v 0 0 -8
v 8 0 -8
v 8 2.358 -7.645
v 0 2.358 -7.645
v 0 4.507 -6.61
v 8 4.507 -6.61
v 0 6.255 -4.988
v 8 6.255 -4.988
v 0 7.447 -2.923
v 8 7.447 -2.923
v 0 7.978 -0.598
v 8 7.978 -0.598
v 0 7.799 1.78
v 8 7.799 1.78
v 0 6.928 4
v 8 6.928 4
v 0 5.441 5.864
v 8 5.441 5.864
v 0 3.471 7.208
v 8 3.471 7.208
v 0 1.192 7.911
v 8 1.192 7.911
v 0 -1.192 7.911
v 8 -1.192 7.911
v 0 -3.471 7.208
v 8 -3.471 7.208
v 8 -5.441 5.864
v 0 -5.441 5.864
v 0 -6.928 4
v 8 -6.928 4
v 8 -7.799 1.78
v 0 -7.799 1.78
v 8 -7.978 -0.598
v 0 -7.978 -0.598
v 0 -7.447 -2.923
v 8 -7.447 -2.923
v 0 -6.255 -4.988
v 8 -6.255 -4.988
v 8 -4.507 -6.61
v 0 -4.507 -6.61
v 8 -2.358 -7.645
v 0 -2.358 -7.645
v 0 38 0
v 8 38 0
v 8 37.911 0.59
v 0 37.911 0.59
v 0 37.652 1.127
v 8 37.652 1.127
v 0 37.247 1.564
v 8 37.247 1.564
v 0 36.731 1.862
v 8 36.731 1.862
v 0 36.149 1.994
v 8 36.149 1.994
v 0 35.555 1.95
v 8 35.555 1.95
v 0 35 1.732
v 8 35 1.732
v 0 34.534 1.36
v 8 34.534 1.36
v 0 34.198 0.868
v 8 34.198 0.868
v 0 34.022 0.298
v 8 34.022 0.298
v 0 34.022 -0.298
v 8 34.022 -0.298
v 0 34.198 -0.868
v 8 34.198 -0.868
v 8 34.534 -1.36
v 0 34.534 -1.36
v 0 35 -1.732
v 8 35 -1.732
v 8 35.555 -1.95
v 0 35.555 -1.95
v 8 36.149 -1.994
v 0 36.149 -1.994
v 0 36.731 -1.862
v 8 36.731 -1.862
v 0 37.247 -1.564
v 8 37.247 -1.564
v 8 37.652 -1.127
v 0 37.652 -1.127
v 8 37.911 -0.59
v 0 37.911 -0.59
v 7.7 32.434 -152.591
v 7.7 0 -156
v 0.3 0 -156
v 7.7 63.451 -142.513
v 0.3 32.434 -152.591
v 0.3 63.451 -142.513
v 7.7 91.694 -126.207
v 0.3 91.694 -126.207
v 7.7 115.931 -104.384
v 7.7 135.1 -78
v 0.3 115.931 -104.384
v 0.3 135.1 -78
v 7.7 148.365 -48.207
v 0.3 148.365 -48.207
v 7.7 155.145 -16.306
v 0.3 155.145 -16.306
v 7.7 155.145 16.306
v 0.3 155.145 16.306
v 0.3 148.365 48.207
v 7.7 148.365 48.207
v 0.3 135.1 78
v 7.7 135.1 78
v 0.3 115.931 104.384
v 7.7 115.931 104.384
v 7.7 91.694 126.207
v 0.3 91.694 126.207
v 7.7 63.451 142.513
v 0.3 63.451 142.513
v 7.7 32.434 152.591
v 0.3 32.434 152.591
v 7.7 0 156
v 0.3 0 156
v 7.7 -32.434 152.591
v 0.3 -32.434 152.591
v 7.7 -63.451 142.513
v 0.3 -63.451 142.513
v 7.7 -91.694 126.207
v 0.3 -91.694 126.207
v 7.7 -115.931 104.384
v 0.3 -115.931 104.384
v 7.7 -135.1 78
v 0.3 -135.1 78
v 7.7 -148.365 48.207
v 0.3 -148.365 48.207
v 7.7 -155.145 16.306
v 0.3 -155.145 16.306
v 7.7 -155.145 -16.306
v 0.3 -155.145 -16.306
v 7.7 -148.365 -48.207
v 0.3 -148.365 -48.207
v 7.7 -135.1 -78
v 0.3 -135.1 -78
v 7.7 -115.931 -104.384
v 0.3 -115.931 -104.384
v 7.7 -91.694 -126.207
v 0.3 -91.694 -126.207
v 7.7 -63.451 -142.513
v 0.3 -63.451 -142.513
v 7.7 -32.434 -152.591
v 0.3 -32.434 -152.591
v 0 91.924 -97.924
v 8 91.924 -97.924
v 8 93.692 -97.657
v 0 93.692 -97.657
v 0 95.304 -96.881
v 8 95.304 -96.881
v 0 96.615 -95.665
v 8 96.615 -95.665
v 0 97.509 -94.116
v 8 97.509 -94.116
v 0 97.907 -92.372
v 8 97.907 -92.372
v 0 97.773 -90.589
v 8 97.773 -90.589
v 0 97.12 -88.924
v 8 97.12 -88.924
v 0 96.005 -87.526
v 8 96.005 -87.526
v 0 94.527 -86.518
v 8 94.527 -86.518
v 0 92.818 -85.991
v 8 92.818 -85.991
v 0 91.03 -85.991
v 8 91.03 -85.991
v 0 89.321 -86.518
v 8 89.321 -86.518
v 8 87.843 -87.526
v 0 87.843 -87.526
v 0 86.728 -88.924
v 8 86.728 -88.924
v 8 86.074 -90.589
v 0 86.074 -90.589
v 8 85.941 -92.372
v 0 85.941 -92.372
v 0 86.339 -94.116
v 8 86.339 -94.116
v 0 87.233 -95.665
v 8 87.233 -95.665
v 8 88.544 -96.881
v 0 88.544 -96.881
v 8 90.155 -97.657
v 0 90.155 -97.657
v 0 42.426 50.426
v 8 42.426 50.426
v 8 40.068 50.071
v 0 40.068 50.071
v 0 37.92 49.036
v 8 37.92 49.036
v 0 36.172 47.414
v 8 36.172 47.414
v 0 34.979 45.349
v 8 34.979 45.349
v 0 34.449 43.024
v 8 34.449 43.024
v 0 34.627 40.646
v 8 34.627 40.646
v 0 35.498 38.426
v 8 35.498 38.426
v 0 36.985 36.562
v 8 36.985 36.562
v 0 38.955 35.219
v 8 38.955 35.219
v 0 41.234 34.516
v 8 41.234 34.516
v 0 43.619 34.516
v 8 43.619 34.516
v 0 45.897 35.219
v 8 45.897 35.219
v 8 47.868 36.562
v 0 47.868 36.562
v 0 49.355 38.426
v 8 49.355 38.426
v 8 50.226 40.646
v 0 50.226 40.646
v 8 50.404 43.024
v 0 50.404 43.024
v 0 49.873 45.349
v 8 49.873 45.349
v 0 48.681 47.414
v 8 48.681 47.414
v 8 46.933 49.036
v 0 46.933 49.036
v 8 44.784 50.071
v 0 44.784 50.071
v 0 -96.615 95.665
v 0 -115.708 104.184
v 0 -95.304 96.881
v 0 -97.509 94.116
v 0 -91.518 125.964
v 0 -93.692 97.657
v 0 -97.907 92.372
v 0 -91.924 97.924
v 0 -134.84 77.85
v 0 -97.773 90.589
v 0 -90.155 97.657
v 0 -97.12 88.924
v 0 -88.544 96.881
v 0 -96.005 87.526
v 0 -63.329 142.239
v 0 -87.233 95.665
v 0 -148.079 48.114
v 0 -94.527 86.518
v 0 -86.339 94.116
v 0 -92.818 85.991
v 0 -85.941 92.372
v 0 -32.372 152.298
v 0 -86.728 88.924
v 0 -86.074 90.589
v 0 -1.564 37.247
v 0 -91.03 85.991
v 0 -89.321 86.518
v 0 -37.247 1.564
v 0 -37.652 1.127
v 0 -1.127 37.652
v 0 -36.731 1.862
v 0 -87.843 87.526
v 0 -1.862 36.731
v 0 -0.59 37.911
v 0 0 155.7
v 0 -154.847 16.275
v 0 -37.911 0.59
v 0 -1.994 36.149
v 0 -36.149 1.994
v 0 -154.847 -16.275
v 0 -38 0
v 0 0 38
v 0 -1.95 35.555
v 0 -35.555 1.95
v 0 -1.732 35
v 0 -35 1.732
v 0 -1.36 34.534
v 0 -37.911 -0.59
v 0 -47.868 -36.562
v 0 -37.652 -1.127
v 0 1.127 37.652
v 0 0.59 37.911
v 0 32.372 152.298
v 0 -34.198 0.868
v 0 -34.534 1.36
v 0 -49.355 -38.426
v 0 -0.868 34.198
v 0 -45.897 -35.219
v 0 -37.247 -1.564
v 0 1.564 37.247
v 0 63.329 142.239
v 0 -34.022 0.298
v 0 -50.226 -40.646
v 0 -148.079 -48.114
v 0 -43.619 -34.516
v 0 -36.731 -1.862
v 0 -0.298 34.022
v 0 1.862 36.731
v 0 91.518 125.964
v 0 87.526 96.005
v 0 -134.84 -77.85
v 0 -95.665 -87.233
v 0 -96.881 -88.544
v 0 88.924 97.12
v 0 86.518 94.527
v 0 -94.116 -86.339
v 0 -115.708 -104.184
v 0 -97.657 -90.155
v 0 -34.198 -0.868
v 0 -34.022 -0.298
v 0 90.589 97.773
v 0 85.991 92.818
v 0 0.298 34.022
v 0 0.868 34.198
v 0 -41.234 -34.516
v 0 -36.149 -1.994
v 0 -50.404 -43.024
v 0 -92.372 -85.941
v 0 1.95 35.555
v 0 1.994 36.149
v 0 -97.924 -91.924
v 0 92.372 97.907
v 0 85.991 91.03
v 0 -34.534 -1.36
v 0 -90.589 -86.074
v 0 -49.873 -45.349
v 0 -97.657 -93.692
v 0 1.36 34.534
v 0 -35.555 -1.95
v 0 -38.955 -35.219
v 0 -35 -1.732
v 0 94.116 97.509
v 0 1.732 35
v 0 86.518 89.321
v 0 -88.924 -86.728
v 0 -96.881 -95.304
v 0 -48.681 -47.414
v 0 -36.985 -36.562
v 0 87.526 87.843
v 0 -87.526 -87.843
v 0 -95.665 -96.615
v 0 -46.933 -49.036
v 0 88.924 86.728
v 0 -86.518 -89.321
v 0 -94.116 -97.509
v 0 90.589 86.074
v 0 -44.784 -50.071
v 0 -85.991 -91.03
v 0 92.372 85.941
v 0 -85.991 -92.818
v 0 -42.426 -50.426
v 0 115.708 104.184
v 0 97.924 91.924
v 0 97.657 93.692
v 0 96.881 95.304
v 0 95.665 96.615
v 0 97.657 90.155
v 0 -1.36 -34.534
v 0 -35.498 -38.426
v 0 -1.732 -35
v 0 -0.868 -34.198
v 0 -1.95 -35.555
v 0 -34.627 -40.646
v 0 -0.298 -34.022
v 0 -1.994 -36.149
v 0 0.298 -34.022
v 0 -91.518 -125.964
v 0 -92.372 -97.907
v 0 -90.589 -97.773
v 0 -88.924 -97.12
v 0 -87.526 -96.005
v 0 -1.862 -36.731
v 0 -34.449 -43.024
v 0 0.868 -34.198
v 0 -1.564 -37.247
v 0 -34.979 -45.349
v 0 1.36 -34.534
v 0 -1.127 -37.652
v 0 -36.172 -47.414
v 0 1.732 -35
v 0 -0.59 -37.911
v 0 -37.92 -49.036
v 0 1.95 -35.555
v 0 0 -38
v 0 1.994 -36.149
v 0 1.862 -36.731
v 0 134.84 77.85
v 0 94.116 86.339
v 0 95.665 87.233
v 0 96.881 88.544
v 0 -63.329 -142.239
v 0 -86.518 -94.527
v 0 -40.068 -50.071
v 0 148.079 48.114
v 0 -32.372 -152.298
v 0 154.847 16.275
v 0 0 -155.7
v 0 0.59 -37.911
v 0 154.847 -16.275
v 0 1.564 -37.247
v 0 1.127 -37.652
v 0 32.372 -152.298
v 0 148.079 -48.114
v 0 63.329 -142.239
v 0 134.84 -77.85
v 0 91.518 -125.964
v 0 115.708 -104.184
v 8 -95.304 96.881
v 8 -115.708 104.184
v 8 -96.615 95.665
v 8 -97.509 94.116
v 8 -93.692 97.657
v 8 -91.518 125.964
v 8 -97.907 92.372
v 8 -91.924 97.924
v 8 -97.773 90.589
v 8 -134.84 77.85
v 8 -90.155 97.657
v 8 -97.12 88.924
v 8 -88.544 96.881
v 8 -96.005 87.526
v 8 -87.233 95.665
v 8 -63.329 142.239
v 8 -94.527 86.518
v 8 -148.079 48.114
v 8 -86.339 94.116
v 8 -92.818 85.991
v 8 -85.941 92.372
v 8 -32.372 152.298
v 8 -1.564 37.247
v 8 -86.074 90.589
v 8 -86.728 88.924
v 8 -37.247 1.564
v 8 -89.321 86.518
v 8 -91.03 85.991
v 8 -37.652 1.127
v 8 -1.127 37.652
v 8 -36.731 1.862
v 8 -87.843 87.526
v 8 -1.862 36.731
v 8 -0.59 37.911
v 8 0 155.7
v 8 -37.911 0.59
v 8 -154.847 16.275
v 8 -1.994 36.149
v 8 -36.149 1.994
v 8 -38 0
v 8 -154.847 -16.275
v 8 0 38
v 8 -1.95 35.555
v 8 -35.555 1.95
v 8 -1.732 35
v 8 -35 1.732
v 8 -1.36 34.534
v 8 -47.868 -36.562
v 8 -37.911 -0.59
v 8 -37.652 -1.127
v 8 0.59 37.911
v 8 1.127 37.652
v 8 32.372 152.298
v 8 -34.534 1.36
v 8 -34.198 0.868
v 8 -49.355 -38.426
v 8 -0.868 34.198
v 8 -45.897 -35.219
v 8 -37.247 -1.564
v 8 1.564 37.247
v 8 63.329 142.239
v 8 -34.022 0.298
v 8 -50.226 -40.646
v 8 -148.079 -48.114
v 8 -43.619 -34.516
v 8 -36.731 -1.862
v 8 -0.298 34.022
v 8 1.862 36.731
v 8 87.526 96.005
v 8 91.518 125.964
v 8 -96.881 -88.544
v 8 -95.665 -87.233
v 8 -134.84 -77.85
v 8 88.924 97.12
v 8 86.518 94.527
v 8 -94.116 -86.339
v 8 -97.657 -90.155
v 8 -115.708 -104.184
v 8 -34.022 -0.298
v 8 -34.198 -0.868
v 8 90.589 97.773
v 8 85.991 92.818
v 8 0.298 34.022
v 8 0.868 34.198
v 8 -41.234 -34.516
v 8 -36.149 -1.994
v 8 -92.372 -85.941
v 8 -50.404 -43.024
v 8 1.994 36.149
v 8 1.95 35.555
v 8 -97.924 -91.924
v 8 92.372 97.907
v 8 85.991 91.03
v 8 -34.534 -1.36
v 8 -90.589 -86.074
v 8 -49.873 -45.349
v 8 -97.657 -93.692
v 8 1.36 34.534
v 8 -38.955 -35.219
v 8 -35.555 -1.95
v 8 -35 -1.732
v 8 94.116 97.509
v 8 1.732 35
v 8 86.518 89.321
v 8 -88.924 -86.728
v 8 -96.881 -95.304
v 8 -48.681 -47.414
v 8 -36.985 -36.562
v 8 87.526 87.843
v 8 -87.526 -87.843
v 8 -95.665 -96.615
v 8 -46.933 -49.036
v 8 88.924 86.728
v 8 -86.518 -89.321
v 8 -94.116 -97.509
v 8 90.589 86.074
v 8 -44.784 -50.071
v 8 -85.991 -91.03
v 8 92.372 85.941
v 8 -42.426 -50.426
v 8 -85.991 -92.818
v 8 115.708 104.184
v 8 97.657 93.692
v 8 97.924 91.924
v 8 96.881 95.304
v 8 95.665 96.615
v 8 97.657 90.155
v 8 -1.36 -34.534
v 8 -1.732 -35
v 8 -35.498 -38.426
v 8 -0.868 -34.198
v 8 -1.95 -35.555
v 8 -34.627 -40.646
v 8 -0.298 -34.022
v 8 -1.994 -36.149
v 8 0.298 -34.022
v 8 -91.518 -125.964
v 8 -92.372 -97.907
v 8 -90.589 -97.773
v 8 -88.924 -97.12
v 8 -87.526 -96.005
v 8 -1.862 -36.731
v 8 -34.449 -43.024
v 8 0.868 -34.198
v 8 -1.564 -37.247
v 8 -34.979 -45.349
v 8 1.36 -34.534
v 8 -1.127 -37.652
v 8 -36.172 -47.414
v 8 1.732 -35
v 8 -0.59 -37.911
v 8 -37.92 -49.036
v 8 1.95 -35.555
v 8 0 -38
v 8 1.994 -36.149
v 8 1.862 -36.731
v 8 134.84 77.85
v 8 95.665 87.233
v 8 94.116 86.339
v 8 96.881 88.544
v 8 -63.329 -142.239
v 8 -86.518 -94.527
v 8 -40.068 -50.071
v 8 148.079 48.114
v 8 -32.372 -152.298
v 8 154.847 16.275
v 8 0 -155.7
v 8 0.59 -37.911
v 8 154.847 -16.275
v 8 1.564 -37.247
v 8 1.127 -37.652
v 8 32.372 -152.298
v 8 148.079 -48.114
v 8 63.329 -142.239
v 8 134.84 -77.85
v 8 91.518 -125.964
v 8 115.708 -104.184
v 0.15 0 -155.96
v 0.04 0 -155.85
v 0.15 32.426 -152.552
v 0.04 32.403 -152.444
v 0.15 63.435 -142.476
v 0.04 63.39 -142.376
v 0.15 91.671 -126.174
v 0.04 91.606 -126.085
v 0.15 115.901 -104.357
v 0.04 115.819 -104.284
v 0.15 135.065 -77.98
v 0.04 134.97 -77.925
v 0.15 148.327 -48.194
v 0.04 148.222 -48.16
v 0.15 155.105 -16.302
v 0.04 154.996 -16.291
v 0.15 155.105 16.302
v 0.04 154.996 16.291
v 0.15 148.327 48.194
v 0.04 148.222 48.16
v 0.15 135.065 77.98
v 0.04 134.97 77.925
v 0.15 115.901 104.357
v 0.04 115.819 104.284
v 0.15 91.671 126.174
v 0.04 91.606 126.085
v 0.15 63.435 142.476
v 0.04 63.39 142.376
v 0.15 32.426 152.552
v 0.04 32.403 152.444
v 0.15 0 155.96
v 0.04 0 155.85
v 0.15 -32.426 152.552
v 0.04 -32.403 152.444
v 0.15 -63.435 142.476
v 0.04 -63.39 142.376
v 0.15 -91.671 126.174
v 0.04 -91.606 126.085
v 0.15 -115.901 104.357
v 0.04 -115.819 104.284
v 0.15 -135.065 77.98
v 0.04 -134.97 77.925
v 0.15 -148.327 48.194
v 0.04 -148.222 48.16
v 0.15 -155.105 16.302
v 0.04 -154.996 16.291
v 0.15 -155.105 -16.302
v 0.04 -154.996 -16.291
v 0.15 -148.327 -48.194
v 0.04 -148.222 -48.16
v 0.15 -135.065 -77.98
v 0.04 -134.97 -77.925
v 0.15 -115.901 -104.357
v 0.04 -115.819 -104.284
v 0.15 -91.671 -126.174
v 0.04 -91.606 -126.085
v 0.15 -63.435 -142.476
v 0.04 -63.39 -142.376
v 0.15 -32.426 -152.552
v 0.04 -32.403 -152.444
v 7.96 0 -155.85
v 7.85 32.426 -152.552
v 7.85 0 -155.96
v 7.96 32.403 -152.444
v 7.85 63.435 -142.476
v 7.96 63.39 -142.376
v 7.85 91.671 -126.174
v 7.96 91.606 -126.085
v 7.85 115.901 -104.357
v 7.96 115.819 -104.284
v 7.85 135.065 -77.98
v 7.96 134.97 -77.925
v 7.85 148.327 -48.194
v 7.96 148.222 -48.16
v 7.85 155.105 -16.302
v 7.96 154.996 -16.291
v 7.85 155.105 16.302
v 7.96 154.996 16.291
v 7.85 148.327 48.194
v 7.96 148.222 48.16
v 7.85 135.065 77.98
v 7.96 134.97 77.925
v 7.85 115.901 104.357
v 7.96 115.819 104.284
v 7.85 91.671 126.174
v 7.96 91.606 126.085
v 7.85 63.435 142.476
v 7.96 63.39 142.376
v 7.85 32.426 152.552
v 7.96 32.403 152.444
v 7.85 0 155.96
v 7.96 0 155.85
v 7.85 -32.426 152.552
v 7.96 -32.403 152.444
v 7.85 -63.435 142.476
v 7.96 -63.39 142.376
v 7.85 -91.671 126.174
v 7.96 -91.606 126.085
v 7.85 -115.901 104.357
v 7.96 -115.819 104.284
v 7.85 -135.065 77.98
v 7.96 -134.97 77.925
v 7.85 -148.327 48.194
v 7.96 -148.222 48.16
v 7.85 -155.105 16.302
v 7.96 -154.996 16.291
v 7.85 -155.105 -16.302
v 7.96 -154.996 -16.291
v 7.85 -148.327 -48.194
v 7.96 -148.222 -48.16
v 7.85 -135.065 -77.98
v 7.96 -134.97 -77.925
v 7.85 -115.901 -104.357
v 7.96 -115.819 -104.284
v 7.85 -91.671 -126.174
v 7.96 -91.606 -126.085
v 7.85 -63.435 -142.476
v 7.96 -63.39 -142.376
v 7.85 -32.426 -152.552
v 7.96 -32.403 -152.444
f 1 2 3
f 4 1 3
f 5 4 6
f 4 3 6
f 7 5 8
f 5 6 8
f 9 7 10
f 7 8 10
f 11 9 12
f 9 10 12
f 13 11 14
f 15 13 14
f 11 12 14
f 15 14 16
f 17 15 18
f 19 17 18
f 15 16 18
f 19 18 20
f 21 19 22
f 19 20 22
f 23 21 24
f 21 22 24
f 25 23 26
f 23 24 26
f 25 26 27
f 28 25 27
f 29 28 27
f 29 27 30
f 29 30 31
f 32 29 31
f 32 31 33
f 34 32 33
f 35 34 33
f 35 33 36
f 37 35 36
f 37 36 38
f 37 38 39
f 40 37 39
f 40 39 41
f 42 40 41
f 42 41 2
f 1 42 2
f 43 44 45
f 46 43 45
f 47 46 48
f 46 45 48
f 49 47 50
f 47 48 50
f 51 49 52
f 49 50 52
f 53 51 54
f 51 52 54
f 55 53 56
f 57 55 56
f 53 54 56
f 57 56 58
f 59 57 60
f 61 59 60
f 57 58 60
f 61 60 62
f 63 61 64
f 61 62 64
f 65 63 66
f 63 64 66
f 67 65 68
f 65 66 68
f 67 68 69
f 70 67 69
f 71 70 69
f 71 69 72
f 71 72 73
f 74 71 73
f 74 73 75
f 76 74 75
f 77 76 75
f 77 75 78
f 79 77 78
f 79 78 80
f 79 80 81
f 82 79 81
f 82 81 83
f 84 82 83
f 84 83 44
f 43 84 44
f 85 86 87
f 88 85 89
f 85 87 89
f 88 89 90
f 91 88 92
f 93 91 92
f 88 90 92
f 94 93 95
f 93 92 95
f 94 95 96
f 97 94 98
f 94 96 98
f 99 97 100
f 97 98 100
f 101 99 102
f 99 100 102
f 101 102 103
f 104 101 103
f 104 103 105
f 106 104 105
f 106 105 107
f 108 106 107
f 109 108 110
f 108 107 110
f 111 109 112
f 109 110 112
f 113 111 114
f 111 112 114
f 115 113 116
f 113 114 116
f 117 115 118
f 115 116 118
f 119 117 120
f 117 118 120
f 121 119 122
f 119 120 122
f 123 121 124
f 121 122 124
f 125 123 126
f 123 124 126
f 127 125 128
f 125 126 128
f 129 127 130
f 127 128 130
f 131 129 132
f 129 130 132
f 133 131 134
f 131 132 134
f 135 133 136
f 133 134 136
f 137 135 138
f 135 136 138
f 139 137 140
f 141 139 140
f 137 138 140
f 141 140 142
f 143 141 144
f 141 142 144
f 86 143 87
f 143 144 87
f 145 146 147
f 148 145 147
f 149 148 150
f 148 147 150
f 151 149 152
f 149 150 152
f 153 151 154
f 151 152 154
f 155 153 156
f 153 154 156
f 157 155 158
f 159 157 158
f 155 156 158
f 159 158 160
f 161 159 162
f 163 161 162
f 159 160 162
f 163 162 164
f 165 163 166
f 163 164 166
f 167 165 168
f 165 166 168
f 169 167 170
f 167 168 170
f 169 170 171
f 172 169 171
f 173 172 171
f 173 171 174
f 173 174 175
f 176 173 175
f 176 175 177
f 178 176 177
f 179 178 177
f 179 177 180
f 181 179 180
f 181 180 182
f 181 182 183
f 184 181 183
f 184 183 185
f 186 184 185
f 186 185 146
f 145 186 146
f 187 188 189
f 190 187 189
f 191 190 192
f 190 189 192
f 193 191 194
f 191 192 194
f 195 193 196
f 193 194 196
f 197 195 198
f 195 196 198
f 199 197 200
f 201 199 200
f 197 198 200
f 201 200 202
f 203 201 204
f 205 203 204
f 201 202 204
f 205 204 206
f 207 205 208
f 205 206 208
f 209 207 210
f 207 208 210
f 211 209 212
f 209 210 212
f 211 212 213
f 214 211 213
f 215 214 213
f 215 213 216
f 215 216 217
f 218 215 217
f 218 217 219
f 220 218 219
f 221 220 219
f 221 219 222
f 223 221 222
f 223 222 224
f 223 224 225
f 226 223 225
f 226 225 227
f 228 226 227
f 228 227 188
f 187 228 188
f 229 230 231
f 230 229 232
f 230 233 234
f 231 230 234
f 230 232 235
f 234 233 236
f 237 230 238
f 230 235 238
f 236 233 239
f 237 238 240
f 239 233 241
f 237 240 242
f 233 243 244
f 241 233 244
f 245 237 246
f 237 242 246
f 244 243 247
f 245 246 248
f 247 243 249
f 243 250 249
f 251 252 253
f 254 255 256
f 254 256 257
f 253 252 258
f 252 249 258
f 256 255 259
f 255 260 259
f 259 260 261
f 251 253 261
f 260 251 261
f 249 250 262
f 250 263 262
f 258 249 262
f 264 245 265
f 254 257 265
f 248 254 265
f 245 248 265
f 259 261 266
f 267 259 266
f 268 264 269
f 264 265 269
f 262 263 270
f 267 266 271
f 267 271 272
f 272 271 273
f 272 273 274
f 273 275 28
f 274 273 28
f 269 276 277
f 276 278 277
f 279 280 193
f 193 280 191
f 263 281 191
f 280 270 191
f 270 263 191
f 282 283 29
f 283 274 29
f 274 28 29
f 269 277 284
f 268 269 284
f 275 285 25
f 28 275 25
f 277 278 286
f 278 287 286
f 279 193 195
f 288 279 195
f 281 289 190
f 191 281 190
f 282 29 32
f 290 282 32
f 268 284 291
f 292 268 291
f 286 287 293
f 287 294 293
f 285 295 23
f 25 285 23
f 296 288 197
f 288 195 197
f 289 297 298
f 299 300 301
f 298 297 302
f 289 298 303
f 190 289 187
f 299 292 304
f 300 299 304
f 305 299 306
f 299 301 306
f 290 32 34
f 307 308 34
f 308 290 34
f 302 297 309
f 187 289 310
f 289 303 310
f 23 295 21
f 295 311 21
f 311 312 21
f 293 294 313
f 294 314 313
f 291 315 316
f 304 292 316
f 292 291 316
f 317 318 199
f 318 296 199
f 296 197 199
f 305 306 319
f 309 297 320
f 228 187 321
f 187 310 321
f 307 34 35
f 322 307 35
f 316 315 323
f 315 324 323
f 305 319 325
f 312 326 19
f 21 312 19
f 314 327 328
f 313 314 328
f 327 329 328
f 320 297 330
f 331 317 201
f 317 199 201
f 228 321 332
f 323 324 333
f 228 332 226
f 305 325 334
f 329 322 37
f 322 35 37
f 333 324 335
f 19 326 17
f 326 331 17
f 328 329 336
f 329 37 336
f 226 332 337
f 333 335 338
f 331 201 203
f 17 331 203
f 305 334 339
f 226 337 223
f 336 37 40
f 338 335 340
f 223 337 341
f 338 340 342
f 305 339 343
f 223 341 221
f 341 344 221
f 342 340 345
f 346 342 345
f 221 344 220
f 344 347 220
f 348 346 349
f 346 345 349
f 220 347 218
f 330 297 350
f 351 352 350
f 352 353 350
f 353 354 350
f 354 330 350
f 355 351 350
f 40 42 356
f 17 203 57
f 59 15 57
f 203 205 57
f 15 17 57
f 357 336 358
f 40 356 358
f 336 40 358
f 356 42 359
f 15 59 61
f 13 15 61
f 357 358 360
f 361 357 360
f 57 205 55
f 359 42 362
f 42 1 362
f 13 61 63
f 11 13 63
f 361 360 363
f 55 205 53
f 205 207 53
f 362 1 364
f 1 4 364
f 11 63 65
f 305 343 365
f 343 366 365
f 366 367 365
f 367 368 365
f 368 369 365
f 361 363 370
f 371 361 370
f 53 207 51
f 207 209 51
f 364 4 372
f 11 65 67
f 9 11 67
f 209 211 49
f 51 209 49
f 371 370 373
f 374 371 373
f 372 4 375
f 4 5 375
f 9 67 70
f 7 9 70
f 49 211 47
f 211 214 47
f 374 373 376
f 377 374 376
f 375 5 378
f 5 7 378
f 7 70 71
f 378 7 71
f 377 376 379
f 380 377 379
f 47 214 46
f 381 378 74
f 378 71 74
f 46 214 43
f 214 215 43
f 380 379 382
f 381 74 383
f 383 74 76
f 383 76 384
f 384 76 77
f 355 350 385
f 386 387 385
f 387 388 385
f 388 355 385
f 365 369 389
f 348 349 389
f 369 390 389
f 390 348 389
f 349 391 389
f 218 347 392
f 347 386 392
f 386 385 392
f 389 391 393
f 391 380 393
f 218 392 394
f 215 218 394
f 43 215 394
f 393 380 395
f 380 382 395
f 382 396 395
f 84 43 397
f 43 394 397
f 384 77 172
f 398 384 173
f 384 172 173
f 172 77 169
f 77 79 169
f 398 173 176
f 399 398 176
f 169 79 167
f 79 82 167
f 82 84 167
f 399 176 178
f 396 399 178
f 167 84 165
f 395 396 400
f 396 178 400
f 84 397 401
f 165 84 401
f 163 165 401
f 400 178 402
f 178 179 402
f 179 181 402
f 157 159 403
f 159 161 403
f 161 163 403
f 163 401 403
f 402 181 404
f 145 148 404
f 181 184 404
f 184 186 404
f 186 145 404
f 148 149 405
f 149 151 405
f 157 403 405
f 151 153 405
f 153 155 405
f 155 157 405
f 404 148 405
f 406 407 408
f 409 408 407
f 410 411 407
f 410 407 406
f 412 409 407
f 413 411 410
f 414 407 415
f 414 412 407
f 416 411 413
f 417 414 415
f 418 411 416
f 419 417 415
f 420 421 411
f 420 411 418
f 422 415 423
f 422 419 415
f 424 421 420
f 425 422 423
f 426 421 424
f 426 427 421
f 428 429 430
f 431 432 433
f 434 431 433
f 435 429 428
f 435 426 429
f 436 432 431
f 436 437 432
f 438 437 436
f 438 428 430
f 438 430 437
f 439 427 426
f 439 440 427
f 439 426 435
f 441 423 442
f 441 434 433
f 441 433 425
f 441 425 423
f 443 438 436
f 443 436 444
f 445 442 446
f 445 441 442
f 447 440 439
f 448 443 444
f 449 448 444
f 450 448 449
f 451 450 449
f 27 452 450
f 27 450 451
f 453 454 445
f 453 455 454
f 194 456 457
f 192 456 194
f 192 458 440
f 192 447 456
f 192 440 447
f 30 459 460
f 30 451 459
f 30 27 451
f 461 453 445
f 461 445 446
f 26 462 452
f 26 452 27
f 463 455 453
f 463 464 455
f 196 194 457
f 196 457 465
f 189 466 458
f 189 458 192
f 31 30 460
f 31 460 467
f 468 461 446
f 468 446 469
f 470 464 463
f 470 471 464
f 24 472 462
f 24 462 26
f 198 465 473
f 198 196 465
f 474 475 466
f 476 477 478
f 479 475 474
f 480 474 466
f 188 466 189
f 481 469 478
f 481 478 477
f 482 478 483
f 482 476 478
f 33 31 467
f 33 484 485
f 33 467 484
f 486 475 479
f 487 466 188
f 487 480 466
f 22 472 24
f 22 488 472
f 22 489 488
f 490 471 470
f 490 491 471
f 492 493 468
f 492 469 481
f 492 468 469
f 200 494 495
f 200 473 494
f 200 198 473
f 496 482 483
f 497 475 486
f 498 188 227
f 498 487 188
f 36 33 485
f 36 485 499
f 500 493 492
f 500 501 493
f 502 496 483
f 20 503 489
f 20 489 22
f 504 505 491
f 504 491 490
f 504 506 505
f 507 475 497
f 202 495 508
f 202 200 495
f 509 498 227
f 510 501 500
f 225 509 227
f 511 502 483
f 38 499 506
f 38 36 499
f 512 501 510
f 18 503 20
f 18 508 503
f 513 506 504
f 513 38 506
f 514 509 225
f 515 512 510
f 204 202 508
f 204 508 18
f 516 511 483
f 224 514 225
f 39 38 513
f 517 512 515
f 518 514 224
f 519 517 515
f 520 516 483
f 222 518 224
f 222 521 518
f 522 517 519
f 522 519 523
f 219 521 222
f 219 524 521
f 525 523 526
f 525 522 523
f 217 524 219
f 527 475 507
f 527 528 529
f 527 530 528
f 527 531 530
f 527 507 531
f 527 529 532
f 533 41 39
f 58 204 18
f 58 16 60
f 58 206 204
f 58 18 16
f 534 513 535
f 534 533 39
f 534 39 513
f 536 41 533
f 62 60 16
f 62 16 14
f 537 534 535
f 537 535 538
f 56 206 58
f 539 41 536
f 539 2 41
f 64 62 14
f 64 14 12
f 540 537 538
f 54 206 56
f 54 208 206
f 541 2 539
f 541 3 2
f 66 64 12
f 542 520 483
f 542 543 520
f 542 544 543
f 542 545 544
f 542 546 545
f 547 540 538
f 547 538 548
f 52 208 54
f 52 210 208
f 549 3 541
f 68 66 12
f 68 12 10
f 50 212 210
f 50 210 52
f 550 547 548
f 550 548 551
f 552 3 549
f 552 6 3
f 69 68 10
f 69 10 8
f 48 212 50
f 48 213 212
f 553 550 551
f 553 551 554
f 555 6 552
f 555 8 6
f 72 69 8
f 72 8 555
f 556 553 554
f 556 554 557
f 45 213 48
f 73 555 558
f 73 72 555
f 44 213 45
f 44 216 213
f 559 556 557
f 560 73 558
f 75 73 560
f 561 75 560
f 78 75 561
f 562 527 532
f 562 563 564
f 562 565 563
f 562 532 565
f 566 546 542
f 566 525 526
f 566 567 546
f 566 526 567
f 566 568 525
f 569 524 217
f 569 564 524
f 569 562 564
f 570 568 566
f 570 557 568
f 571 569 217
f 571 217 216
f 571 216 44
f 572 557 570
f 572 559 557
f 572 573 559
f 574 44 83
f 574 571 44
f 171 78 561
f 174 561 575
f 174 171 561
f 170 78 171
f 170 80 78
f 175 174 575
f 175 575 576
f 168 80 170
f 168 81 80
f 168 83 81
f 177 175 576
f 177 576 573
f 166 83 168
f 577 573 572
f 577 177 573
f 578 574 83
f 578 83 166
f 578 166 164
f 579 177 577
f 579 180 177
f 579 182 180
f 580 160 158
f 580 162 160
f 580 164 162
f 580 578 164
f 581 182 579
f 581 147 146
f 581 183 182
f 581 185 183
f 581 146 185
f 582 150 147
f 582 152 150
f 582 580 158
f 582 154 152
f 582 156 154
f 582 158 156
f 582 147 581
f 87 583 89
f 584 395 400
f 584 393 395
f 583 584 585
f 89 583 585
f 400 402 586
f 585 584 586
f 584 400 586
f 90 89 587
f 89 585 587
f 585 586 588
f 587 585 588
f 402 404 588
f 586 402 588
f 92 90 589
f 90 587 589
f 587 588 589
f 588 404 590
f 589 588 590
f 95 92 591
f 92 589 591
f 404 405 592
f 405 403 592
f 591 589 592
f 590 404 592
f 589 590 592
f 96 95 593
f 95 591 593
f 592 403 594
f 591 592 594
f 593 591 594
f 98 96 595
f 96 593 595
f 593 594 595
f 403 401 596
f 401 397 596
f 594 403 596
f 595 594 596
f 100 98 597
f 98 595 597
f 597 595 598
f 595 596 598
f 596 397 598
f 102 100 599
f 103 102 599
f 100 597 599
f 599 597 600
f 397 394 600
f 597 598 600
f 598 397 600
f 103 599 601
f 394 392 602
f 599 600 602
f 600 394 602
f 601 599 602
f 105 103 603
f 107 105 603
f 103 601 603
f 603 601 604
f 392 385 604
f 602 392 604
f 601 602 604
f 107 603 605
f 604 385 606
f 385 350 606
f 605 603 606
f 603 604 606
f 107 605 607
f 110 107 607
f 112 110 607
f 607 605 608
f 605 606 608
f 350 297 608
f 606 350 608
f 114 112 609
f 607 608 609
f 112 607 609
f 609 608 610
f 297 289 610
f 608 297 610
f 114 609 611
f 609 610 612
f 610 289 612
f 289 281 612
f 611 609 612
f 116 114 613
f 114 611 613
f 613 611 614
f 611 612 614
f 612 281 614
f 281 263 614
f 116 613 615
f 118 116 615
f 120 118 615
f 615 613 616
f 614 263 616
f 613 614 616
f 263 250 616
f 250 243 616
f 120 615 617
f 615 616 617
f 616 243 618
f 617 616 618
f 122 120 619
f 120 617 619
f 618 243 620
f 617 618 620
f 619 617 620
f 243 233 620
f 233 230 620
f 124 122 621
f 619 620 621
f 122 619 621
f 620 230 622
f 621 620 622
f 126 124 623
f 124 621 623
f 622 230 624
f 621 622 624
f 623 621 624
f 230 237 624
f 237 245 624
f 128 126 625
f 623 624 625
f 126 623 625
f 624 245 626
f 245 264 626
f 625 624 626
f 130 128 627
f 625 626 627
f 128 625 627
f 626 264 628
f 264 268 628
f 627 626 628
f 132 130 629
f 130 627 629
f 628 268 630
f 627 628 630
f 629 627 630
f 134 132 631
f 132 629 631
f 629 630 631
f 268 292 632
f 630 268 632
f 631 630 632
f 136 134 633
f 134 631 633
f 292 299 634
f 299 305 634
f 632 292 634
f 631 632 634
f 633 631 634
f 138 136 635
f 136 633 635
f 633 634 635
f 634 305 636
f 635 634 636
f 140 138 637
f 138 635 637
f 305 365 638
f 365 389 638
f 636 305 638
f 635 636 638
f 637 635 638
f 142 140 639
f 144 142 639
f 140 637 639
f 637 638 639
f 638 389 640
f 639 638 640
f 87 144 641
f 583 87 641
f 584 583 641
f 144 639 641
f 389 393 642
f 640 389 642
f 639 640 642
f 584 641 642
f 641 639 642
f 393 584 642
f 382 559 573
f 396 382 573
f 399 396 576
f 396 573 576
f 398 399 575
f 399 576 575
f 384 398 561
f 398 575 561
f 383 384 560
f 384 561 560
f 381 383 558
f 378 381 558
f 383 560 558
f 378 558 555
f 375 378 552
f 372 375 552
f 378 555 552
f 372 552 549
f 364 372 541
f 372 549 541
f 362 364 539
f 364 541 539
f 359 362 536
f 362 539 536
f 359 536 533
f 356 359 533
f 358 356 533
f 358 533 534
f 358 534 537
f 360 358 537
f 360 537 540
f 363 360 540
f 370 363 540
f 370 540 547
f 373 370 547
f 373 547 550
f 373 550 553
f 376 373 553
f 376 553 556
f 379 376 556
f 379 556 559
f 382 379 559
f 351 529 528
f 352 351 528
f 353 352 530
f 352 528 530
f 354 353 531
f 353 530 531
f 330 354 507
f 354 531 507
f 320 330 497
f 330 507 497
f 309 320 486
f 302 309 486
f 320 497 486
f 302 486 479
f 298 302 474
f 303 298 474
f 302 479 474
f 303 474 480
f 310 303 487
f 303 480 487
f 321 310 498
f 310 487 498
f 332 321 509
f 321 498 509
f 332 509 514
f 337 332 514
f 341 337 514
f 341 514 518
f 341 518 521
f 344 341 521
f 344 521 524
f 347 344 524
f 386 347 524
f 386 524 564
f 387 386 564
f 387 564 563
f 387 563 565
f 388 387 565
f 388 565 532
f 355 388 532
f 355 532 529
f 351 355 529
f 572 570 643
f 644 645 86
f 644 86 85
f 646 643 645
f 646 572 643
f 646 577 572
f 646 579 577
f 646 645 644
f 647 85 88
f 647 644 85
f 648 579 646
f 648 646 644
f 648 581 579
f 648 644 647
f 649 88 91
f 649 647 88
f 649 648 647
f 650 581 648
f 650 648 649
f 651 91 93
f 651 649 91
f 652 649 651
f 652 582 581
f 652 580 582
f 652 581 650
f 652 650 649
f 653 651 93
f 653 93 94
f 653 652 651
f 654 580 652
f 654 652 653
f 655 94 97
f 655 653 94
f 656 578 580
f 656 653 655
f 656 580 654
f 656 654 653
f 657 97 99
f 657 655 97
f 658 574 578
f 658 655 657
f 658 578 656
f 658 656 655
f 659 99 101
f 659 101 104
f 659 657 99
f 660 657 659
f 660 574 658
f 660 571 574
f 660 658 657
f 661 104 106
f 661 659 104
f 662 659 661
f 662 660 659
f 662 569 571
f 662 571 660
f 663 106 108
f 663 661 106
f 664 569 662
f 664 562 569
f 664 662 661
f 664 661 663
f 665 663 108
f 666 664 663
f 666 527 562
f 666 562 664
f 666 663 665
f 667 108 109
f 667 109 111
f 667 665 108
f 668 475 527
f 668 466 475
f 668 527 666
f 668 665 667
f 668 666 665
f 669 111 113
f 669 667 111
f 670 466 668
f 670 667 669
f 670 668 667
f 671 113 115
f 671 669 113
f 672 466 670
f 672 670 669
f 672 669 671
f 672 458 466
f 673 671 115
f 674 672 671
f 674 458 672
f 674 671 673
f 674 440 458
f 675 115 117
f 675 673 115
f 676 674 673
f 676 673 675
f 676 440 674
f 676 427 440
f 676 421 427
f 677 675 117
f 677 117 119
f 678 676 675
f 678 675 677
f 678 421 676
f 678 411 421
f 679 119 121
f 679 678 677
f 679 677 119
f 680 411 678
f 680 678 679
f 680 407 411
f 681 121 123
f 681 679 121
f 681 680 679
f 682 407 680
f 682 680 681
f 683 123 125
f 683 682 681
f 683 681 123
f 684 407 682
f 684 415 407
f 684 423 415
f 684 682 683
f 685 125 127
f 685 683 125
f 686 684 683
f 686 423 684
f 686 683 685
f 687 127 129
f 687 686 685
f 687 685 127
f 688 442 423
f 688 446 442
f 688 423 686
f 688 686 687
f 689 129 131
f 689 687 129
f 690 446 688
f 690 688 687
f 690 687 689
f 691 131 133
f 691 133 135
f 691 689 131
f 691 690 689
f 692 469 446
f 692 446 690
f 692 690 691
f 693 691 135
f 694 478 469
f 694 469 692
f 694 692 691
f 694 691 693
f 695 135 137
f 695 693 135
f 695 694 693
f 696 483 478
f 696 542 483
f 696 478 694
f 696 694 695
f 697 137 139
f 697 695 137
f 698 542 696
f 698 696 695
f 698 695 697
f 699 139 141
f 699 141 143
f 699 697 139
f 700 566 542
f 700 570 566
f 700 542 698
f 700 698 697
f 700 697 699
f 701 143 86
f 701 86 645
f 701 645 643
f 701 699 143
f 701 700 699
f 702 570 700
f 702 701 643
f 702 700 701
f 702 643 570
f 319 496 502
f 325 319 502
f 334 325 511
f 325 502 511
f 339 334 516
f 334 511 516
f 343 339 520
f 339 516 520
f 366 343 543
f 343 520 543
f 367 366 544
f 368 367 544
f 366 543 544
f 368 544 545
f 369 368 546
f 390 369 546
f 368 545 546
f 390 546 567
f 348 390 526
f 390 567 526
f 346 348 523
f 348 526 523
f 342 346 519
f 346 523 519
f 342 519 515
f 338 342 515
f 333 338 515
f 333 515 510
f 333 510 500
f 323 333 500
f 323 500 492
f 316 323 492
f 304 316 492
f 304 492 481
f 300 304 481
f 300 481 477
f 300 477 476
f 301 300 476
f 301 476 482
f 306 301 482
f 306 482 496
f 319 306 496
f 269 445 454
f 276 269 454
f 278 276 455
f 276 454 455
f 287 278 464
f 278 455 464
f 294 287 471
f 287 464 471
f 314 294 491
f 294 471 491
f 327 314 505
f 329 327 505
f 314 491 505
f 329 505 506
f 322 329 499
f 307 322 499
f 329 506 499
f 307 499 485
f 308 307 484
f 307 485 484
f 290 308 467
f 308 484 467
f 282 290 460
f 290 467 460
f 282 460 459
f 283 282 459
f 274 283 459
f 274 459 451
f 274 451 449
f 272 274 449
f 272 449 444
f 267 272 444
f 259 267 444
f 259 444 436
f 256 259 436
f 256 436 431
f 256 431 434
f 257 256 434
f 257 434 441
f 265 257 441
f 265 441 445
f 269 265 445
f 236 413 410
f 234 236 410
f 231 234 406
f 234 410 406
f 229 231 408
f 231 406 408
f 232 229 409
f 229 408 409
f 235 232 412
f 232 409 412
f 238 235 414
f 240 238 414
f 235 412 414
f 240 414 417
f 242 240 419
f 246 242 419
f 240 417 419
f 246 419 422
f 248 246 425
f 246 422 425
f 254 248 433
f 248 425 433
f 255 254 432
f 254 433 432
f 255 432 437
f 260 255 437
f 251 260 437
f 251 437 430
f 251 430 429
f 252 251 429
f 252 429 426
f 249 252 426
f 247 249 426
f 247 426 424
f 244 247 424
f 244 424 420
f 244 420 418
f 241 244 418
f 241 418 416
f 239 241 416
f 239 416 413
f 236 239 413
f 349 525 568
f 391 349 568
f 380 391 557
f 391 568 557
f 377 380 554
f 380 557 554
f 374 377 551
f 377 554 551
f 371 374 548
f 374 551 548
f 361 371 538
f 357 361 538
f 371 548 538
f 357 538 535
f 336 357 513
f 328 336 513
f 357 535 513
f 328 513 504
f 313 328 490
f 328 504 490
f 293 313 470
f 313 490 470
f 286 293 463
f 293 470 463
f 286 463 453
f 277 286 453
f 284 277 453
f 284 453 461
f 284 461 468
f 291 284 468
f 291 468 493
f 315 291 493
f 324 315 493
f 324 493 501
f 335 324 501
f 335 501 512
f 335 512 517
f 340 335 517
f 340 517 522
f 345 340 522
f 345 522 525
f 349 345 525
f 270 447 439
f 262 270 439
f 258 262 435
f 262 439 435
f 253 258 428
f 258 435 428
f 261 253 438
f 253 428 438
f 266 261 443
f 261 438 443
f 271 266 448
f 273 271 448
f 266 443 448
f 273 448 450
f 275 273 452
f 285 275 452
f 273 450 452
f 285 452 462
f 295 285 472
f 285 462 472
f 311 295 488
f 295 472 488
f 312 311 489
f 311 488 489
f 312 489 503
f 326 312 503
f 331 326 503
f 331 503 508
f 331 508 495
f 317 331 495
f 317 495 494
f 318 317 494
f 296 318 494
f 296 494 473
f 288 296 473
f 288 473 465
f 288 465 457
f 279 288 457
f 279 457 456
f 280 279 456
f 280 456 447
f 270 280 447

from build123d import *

# Parameters (mm, degrees)
SKETCH_1_R               = 156
EXTRUDE_1_DEPTH          = 8
SKETCH_4_R               = 6
CUT_EXTRUDE_3_DEPTH      = 10
PATTERN_CIRCULAR_2_COUNT = 4
FILLET_1_R               = 0.3
SKETCH_8_R               = 8
CUT_EXTRUDE_7_DEPTH      = 10
PATTERN_CIRCULAR_3_COUNT = 2
SKETCH_9_R               = 8
CUT_EXTRUDE_8_DEPTH      = 10
SKETCH_10_R              = 2
CUT_EXTRUDE_9_DEPTH      = 10
PATTERN_CIRCULAR_5_COUNT = 4


with BuildPart() as part:
    # 草图1 → 凸台-拉伸1 (new body)
    with BuildSketch(Plane(origin=(0, 0, 0), x_dir=(0, 0, -1), z_dir=(1, 0, 0))):
        Circle(SKETCH_1_R)
    extrude(amount=EXTRUDE_1_DEPTH)

    # 草图4 → 切除-拉伸3 (cut)
    with BuildSketch(Plane(origin=(8, 0, 0), x_dir=(0, 0, -1), z_dir=(1, 0, 0))):
        with Locations((91.923881554, 91.923881554)):
            Circle(SKETCH_4_R)
    cut_extrude_3 = extrude(amount=-CUT_EXTRUDE_3_DEPTH, mode=Mode.SUBTRACT)

    # 阵列(圆周)2: 切除-拉伸3 ×4 about axis
    pattern_circular_2_axis = Axis((0, 0, 0), (1, 0, 0))
    for i in range(1, PATTERN_CIRCULAR_2_COUNT):
        add(cut_extrude_3.rotate(pattern_circular_2_axis, i * 360 / PATTERN_CIRCULAR_2_COUNT), mode=Mode.SUBTRACT)

    # 圆角1
    fillet_1_edges = [part.edges().sort_by_distance(p)[0] for p in [
        (0, 0, 156),
        (8, 0, 156),
    ]]
    fillet(fillet_1_edges, radius=FILLET_1_R)

    # 草图8 → 切除-拉伸7 (cut)
    with BuildSketch(Plane(origin=(8, 0, 0), x_dir=(0, 0, -1), z_dir=(1, 0, 0))):
        with Locations((42.426406871, -42.426406871)):
            Circle(SKETCH_8_R)
    cut_extrude_7 = extrude(amount=-CUT_EXTRUDE_7_DEPTH, mode=Mode.SUBTRACT)

    # 阵列(圆周)3: 切除-拉伸7 ×2 about axis
    pattern_circular_3_axis = Axis((0, 0, 0), (1, 0, 0))
    for i in range(1, PATTERN_CIRCULAR_3_COUNT):
        add(cut_extrude_7.rotate(pattern_circular_3_axis, i * 360 / PATTERN_CIRCULAR_3_COUNT), mode=Mode.SUBTRACT)

    # 草图9 → 切除-拉伸8 (cut)
    with BuildSketch(Plane(origin=(8, 0, 0), x_dir=(0, 0, -1), z_dir=(1, 0, 0))):
        Circle(SKETCH_9_R)
    extrude(amount=-CUT_EXTRUDE_8_DEPTH, mode=Mode.SUBTRACT)

    # 草图10 → 切除-拉伸9 (cut)
    with BuildSketch(Plane(origin=(8, 0, 0), x_dir=(0, 0, -1), z_dir=(1, 0, 0))):
        with Locations((36, 0)):
            Circle(SKETCH_10_R)
    cut_extrude_9 = extrude(amount=-CUT_EXTRUDE_9_DEPTH, mode=Mode.SUBTRACT)

    # 阵列(圆周)5: 切除-拉伸9 ×4 about axis
    pattern_circular_5_axis = Axis((0, 0, 0), (1, 0, 0))
    for i in range(1, PATTERN_CIRCULAR_5_COUNT):
        add(cut_extrude_9.rotate(pattern_circular_5_axis, i * 360 / PATTERN_CIRCULAR_5_COUNT), mode=Mode.SUBTRACT)


solid = part.part
